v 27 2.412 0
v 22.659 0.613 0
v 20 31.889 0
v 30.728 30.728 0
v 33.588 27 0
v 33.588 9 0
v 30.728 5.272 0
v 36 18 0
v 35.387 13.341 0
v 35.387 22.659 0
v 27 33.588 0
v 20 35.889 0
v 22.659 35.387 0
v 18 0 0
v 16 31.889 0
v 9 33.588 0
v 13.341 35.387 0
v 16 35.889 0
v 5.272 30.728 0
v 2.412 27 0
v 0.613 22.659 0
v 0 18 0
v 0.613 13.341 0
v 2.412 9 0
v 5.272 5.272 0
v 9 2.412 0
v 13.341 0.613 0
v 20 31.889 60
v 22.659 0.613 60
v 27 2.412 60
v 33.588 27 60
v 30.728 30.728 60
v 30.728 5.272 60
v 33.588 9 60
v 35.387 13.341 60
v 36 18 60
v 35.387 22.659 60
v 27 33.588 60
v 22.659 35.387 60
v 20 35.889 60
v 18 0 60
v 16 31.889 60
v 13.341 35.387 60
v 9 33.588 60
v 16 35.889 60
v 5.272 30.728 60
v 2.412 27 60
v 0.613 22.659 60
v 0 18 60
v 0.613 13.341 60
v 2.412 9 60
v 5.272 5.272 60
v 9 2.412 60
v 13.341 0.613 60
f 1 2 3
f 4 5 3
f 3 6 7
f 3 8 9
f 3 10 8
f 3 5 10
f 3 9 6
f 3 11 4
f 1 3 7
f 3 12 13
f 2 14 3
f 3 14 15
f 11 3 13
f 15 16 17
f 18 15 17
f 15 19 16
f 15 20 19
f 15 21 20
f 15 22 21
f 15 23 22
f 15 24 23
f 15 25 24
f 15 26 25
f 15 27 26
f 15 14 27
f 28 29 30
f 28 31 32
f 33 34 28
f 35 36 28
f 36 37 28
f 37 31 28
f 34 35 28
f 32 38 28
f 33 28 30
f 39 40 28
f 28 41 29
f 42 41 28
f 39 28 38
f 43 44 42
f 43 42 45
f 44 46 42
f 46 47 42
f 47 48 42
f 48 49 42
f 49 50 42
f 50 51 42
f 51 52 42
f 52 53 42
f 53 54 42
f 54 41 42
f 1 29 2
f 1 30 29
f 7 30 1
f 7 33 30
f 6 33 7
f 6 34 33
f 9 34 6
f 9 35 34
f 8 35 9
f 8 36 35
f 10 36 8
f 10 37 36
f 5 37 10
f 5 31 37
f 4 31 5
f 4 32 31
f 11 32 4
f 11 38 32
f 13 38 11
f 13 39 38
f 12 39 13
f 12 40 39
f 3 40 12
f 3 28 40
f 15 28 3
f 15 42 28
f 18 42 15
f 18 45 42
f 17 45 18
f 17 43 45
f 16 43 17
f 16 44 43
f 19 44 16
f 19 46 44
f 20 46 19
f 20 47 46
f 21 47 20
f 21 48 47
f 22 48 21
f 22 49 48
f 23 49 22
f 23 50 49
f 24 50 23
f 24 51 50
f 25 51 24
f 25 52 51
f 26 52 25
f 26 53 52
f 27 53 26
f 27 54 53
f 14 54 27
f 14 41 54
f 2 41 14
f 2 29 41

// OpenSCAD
$fn = 32;

// ----------------------------------------------------------------------
// Keyway shaft: d36 shaft, key 4 x 4 mm
// ----------------------------------------------------------------------

// --- parameters (mm) ---
shaft_r = 18;             // shaft radius
key_w = 4;                // keyway width
key_d = 4;                // keyway depth below the surface line
plate_t = 60;             // shaft length, Z (extrusion height)
fit_tol = 0.02;           // declared fit tolerance (prompt contract)
free_tol = 0.2;           // declared free tolerance (prompt contract)

shaft_d = 2 * shaft_r;  // shaft diameter
circle_step = 15;  // polygon sampling step, degrees

profile = [[13.341, 35.387], [9, 33.588], [5.272, 30.728], [2.412, 27], [0.613, 22.659], [0, 18], [0.613, 13.341], [2.412, 9], [5.272, 5.272], [9, 2.412], [13.341, 0.613], [18, 0], [22.659, 0.613], [27, 2.412], [30.728, 5.272], [33.588, 9], [35.387, 13.341], [36, 18], [35.387, 22.659], [33.588, 27], [30.728, 30.728], [27, 33.588], [22.659, 35.387], [20, 35.889], [20, 31.889], [16, 31.889], [16, 35.889]];  // primary outline, 27 points, counter clockwise

// --- the one profile operation ---
linear_extrude(height = plate_t) polygon(points = profile);
